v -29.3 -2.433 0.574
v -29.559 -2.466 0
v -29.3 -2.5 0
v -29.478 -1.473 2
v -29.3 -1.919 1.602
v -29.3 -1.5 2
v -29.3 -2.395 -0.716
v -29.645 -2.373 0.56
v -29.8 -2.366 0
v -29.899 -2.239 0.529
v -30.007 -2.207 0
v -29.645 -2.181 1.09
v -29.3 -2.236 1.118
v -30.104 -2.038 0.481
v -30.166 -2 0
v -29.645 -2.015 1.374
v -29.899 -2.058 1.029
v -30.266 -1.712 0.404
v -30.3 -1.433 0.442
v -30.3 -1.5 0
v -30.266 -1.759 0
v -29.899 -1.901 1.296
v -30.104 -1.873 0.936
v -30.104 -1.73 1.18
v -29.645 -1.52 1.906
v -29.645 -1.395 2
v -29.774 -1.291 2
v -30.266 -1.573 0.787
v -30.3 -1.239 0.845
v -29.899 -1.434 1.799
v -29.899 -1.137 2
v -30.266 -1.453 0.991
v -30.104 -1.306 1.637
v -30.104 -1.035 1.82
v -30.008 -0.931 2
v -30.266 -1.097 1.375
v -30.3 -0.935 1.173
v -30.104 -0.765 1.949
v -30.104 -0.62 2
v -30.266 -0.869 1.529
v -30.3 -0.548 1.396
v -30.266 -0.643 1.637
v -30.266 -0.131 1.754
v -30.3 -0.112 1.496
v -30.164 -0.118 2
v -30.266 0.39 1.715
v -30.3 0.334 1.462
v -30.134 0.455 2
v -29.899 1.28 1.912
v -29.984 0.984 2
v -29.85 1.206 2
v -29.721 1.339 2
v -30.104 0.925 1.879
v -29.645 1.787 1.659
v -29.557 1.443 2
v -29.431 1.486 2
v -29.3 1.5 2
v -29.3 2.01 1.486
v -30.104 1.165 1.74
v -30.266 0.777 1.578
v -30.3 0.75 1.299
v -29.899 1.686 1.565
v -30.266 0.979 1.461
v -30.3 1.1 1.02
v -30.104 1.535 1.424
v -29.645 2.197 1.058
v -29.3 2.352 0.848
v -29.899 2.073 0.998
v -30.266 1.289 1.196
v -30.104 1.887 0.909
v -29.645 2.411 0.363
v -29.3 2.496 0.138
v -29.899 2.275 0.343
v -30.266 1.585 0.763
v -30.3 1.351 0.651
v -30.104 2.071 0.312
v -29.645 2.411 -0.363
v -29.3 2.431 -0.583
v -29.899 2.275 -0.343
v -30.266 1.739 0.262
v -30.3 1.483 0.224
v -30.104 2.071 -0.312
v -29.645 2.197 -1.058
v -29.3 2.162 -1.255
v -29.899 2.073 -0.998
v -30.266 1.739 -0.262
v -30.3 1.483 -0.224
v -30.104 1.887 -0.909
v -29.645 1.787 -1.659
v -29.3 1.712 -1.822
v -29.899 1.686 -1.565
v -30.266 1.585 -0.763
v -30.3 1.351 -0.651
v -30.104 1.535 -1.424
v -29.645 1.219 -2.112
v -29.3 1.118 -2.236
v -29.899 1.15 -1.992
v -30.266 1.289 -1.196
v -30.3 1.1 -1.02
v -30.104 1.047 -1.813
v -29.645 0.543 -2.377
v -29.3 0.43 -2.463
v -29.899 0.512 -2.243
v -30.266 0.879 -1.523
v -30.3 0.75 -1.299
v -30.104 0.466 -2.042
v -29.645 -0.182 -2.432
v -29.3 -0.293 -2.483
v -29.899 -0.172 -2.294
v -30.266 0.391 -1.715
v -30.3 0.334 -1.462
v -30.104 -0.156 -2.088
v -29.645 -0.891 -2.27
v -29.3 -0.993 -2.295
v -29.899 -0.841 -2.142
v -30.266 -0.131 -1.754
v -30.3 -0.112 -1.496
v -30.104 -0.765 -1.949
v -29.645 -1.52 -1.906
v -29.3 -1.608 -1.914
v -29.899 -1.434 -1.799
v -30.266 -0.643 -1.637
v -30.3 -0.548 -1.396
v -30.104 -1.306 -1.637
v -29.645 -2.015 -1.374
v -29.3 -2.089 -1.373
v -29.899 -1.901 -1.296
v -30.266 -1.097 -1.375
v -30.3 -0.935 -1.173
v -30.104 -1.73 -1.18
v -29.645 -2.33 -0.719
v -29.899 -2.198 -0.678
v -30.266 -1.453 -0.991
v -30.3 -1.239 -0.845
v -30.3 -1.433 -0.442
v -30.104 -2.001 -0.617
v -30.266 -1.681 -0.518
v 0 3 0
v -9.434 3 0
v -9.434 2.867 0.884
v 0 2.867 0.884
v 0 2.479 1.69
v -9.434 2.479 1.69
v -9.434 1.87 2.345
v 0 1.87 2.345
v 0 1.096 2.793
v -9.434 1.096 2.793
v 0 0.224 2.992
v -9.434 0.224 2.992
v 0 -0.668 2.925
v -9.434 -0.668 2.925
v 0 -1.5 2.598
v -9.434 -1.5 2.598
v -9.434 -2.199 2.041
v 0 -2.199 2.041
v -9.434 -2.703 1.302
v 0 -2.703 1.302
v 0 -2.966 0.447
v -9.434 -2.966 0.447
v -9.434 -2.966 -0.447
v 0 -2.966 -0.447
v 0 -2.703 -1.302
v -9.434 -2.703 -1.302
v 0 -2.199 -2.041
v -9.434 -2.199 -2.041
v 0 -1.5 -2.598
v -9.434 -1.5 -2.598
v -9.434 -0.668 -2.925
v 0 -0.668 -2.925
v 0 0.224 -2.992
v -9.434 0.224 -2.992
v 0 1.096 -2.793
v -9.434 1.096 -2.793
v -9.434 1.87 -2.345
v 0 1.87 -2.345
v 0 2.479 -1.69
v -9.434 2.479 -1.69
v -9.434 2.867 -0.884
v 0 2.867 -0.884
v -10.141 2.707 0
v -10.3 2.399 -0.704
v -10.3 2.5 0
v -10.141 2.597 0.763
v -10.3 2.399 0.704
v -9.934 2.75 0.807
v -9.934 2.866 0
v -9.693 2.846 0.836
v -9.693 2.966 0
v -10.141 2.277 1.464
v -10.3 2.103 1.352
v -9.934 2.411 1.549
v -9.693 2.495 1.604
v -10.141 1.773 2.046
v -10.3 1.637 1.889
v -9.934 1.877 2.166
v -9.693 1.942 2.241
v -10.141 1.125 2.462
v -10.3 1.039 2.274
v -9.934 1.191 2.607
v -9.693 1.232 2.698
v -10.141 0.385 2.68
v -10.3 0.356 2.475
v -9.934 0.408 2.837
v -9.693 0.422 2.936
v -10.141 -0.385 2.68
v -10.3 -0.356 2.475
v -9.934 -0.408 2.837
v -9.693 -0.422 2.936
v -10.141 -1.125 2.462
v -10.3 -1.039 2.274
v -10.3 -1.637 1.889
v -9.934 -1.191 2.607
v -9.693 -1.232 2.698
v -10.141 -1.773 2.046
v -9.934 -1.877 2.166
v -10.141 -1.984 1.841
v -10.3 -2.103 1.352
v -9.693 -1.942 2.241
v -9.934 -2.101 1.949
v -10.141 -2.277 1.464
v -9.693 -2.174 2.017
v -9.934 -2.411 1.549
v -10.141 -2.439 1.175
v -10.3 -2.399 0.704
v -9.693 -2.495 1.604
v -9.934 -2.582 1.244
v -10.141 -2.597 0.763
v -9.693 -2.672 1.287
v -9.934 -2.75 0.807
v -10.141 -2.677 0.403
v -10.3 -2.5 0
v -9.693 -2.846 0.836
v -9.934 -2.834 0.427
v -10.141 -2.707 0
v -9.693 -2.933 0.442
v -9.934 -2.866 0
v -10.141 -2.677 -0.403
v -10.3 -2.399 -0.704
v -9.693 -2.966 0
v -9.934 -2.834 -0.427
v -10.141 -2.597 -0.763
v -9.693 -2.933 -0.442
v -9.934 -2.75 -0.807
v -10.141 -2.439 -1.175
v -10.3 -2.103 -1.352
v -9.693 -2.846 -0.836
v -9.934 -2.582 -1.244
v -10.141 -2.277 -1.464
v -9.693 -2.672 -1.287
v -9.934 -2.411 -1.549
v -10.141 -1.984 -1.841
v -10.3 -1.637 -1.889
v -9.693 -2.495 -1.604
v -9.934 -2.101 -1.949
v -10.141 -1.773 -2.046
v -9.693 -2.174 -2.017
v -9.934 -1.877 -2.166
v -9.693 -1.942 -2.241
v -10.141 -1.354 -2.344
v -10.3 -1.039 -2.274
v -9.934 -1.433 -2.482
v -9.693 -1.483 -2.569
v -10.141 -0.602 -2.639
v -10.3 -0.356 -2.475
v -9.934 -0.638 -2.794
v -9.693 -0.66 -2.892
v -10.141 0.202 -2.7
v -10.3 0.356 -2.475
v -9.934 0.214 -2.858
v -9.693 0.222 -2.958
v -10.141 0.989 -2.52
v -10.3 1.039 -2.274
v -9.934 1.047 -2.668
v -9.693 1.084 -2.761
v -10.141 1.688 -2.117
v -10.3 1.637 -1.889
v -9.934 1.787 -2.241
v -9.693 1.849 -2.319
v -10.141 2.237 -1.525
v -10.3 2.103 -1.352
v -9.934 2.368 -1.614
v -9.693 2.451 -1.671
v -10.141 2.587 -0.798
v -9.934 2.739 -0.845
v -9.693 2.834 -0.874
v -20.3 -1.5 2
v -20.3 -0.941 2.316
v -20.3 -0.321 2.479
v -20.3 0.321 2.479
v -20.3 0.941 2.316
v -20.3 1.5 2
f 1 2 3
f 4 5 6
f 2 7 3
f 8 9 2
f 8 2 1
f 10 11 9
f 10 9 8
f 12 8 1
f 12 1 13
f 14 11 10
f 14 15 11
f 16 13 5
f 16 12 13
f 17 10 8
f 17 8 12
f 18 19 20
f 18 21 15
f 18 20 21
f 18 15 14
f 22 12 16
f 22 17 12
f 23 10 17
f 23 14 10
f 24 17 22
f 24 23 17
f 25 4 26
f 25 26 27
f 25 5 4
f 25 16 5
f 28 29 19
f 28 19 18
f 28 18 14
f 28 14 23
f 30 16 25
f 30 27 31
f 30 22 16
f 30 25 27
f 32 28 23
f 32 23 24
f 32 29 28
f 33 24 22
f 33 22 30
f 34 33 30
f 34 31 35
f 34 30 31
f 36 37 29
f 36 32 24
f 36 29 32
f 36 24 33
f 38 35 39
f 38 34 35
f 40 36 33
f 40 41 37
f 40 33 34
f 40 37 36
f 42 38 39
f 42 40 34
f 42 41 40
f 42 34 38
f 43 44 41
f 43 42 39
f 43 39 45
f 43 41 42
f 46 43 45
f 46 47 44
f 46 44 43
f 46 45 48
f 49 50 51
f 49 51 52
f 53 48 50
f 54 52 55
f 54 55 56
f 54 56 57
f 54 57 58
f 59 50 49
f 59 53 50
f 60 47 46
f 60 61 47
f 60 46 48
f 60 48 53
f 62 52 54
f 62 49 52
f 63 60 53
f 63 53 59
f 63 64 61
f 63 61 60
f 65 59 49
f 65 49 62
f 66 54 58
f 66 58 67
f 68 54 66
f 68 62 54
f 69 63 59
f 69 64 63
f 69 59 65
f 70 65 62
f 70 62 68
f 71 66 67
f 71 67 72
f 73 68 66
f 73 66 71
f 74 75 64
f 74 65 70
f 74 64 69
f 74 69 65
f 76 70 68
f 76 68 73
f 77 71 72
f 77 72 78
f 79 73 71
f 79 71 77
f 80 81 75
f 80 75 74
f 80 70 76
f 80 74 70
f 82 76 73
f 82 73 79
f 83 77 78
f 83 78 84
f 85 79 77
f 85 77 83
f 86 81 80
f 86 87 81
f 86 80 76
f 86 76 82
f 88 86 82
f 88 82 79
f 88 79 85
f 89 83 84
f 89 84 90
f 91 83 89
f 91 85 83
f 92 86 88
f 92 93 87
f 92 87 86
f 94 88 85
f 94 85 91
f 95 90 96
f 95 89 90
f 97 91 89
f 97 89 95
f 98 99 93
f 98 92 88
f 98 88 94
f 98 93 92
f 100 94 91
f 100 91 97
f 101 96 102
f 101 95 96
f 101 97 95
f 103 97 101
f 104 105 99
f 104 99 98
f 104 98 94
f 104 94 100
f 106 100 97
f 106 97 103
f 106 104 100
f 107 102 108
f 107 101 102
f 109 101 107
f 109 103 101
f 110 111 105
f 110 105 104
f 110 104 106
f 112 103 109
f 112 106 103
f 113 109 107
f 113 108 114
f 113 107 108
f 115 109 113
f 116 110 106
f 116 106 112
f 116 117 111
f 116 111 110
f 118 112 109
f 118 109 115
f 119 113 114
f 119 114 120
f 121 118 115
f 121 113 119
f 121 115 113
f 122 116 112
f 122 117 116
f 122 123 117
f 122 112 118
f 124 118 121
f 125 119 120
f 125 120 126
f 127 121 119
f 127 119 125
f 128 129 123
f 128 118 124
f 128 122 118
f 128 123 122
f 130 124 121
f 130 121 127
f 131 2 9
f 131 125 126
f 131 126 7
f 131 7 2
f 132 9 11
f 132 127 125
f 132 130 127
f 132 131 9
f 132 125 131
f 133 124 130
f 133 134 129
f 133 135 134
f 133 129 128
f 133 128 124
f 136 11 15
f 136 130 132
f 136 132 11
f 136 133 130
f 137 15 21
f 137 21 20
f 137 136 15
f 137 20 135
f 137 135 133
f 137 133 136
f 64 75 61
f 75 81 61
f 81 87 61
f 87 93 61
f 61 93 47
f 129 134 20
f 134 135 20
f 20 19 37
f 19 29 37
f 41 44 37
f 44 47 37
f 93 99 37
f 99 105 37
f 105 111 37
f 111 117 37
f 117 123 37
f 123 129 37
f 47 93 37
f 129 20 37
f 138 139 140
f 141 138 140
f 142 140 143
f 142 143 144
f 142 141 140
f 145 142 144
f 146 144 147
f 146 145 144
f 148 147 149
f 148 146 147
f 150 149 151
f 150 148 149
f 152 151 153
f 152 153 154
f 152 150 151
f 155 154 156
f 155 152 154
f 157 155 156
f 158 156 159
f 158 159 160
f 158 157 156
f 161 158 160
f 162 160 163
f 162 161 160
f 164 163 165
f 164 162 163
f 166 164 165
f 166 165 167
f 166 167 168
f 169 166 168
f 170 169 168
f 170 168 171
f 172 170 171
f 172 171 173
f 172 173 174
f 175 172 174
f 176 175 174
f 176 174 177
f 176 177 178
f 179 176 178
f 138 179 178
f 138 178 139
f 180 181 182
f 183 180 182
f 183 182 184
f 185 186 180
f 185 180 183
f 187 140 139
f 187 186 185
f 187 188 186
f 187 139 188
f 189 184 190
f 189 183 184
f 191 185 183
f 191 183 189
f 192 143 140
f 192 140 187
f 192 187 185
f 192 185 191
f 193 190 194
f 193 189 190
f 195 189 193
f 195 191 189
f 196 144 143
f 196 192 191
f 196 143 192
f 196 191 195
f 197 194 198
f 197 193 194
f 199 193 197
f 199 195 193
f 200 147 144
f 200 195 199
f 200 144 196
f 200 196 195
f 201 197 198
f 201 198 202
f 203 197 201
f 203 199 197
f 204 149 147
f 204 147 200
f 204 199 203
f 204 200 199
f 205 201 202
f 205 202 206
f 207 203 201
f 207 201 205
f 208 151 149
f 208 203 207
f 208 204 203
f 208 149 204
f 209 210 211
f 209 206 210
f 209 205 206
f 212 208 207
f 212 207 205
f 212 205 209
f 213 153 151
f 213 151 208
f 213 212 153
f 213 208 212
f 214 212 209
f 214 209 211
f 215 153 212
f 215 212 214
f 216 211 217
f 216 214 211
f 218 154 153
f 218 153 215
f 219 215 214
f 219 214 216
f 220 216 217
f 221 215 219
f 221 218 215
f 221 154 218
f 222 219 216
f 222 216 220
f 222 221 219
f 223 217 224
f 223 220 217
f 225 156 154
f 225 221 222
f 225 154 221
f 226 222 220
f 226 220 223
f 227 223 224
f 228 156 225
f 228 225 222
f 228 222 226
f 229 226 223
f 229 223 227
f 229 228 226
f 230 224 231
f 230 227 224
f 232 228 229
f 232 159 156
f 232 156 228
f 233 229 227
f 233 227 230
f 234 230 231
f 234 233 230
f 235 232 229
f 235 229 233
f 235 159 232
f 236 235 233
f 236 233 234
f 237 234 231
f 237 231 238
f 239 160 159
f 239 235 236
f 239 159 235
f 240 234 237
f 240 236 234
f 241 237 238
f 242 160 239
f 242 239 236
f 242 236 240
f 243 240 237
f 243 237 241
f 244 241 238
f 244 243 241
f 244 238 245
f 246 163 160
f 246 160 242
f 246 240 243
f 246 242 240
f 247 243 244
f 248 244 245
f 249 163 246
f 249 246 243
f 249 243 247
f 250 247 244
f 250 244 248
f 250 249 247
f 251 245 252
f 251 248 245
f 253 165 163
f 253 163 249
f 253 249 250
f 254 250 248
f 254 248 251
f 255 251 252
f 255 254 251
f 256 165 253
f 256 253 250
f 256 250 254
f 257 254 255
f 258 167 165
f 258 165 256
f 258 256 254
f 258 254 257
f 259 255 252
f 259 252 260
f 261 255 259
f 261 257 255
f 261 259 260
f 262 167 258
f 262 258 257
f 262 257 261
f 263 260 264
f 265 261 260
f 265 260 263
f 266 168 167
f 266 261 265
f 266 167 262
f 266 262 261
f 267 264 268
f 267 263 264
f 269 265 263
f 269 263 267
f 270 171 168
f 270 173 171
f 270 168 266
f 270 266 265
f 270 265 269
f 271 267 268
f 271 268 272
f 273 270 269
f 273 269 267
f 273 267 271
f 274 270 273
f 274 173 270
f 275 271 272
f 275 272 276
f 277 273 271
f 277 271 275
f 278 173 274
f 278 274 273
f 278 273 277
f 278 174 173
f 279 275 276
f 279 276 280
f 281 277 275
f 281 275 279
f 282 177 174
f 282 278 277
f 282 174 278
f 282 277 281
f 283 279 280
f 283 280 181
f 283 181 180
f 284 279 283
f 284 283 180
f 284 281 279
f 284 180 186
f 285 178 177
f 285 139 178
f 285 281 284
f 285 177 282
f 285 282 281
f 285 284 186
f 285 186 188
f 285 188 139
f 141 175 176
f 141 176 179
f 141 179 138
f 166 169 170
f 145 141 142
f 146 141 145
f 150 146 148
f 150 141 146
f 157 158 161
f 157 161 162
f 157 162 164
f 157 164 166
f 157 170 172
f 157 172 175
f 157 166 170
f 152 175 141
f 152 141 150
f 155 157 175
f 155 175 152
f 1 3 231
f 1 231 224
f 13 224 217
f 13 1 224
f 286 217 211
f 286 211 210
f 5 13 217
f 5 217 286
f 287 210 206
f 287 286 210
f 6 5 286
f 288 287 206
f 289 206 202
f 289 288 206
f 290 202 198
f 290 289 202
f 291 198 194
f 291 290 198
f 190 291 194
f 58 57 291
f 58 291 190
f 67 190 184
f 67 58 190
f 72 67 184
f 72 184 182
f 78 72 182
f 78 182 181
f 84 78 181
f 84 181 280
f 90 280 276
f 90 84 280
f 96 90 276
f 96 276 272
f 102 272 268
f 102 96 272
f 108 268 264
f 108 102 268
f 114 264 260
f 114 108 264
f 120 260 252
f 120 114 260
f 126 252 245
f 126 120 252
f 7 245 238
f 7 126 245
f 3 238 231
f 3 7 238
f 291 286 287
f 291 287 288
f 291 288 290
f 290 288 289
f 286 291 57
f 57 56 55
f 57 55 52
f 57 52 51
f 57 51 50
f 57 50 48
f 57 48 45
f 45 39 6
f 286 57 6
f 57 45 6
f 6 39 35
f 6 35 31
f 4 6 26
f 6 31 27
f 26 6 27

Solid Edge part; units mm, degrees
sketch "Sketch1" plane through (0, 0, 0) normal (1, 0, 0) x (0, 1, 0)
  circle A0 centre (0, 0) radius 3
  dimension "D1" = 6
extrude "Protrusion1" add sketch "Sketch1" against normal blind 30.3
sketch "Sketch2" plane through (-30.3, 0, 0) normal (-1, 0, 0) x (0, -1, 0)
  circle A0 centre (0, 0) radius 2.5
  dimension "D1" = 5
extrude "Extrusionsausschnitt_1" cut sketch "Sketch2" against normal blind 20 flip side to cut
fillet "Verrundung_2" radius 1 1 edges at (-30.3, 2.5, 0)
fillet "Verrundung_3" radius 1 1 edges at (-10.3, 3, 0)
sketch "Sketch3" plane through (-30.3, 0, 0) normal (-1, 0, 0) x (0, -1, 0)
  line L0 (-1.5, 2) -> (1.5, 2)
  dimension "D1" = 0.5
extrude "Extrusionsausschnitt_3" cut sketch "Sketch3" against normal blind 10 material side at (-30.3, 0, 2.05)
properties material "Aluminium, 1060"
